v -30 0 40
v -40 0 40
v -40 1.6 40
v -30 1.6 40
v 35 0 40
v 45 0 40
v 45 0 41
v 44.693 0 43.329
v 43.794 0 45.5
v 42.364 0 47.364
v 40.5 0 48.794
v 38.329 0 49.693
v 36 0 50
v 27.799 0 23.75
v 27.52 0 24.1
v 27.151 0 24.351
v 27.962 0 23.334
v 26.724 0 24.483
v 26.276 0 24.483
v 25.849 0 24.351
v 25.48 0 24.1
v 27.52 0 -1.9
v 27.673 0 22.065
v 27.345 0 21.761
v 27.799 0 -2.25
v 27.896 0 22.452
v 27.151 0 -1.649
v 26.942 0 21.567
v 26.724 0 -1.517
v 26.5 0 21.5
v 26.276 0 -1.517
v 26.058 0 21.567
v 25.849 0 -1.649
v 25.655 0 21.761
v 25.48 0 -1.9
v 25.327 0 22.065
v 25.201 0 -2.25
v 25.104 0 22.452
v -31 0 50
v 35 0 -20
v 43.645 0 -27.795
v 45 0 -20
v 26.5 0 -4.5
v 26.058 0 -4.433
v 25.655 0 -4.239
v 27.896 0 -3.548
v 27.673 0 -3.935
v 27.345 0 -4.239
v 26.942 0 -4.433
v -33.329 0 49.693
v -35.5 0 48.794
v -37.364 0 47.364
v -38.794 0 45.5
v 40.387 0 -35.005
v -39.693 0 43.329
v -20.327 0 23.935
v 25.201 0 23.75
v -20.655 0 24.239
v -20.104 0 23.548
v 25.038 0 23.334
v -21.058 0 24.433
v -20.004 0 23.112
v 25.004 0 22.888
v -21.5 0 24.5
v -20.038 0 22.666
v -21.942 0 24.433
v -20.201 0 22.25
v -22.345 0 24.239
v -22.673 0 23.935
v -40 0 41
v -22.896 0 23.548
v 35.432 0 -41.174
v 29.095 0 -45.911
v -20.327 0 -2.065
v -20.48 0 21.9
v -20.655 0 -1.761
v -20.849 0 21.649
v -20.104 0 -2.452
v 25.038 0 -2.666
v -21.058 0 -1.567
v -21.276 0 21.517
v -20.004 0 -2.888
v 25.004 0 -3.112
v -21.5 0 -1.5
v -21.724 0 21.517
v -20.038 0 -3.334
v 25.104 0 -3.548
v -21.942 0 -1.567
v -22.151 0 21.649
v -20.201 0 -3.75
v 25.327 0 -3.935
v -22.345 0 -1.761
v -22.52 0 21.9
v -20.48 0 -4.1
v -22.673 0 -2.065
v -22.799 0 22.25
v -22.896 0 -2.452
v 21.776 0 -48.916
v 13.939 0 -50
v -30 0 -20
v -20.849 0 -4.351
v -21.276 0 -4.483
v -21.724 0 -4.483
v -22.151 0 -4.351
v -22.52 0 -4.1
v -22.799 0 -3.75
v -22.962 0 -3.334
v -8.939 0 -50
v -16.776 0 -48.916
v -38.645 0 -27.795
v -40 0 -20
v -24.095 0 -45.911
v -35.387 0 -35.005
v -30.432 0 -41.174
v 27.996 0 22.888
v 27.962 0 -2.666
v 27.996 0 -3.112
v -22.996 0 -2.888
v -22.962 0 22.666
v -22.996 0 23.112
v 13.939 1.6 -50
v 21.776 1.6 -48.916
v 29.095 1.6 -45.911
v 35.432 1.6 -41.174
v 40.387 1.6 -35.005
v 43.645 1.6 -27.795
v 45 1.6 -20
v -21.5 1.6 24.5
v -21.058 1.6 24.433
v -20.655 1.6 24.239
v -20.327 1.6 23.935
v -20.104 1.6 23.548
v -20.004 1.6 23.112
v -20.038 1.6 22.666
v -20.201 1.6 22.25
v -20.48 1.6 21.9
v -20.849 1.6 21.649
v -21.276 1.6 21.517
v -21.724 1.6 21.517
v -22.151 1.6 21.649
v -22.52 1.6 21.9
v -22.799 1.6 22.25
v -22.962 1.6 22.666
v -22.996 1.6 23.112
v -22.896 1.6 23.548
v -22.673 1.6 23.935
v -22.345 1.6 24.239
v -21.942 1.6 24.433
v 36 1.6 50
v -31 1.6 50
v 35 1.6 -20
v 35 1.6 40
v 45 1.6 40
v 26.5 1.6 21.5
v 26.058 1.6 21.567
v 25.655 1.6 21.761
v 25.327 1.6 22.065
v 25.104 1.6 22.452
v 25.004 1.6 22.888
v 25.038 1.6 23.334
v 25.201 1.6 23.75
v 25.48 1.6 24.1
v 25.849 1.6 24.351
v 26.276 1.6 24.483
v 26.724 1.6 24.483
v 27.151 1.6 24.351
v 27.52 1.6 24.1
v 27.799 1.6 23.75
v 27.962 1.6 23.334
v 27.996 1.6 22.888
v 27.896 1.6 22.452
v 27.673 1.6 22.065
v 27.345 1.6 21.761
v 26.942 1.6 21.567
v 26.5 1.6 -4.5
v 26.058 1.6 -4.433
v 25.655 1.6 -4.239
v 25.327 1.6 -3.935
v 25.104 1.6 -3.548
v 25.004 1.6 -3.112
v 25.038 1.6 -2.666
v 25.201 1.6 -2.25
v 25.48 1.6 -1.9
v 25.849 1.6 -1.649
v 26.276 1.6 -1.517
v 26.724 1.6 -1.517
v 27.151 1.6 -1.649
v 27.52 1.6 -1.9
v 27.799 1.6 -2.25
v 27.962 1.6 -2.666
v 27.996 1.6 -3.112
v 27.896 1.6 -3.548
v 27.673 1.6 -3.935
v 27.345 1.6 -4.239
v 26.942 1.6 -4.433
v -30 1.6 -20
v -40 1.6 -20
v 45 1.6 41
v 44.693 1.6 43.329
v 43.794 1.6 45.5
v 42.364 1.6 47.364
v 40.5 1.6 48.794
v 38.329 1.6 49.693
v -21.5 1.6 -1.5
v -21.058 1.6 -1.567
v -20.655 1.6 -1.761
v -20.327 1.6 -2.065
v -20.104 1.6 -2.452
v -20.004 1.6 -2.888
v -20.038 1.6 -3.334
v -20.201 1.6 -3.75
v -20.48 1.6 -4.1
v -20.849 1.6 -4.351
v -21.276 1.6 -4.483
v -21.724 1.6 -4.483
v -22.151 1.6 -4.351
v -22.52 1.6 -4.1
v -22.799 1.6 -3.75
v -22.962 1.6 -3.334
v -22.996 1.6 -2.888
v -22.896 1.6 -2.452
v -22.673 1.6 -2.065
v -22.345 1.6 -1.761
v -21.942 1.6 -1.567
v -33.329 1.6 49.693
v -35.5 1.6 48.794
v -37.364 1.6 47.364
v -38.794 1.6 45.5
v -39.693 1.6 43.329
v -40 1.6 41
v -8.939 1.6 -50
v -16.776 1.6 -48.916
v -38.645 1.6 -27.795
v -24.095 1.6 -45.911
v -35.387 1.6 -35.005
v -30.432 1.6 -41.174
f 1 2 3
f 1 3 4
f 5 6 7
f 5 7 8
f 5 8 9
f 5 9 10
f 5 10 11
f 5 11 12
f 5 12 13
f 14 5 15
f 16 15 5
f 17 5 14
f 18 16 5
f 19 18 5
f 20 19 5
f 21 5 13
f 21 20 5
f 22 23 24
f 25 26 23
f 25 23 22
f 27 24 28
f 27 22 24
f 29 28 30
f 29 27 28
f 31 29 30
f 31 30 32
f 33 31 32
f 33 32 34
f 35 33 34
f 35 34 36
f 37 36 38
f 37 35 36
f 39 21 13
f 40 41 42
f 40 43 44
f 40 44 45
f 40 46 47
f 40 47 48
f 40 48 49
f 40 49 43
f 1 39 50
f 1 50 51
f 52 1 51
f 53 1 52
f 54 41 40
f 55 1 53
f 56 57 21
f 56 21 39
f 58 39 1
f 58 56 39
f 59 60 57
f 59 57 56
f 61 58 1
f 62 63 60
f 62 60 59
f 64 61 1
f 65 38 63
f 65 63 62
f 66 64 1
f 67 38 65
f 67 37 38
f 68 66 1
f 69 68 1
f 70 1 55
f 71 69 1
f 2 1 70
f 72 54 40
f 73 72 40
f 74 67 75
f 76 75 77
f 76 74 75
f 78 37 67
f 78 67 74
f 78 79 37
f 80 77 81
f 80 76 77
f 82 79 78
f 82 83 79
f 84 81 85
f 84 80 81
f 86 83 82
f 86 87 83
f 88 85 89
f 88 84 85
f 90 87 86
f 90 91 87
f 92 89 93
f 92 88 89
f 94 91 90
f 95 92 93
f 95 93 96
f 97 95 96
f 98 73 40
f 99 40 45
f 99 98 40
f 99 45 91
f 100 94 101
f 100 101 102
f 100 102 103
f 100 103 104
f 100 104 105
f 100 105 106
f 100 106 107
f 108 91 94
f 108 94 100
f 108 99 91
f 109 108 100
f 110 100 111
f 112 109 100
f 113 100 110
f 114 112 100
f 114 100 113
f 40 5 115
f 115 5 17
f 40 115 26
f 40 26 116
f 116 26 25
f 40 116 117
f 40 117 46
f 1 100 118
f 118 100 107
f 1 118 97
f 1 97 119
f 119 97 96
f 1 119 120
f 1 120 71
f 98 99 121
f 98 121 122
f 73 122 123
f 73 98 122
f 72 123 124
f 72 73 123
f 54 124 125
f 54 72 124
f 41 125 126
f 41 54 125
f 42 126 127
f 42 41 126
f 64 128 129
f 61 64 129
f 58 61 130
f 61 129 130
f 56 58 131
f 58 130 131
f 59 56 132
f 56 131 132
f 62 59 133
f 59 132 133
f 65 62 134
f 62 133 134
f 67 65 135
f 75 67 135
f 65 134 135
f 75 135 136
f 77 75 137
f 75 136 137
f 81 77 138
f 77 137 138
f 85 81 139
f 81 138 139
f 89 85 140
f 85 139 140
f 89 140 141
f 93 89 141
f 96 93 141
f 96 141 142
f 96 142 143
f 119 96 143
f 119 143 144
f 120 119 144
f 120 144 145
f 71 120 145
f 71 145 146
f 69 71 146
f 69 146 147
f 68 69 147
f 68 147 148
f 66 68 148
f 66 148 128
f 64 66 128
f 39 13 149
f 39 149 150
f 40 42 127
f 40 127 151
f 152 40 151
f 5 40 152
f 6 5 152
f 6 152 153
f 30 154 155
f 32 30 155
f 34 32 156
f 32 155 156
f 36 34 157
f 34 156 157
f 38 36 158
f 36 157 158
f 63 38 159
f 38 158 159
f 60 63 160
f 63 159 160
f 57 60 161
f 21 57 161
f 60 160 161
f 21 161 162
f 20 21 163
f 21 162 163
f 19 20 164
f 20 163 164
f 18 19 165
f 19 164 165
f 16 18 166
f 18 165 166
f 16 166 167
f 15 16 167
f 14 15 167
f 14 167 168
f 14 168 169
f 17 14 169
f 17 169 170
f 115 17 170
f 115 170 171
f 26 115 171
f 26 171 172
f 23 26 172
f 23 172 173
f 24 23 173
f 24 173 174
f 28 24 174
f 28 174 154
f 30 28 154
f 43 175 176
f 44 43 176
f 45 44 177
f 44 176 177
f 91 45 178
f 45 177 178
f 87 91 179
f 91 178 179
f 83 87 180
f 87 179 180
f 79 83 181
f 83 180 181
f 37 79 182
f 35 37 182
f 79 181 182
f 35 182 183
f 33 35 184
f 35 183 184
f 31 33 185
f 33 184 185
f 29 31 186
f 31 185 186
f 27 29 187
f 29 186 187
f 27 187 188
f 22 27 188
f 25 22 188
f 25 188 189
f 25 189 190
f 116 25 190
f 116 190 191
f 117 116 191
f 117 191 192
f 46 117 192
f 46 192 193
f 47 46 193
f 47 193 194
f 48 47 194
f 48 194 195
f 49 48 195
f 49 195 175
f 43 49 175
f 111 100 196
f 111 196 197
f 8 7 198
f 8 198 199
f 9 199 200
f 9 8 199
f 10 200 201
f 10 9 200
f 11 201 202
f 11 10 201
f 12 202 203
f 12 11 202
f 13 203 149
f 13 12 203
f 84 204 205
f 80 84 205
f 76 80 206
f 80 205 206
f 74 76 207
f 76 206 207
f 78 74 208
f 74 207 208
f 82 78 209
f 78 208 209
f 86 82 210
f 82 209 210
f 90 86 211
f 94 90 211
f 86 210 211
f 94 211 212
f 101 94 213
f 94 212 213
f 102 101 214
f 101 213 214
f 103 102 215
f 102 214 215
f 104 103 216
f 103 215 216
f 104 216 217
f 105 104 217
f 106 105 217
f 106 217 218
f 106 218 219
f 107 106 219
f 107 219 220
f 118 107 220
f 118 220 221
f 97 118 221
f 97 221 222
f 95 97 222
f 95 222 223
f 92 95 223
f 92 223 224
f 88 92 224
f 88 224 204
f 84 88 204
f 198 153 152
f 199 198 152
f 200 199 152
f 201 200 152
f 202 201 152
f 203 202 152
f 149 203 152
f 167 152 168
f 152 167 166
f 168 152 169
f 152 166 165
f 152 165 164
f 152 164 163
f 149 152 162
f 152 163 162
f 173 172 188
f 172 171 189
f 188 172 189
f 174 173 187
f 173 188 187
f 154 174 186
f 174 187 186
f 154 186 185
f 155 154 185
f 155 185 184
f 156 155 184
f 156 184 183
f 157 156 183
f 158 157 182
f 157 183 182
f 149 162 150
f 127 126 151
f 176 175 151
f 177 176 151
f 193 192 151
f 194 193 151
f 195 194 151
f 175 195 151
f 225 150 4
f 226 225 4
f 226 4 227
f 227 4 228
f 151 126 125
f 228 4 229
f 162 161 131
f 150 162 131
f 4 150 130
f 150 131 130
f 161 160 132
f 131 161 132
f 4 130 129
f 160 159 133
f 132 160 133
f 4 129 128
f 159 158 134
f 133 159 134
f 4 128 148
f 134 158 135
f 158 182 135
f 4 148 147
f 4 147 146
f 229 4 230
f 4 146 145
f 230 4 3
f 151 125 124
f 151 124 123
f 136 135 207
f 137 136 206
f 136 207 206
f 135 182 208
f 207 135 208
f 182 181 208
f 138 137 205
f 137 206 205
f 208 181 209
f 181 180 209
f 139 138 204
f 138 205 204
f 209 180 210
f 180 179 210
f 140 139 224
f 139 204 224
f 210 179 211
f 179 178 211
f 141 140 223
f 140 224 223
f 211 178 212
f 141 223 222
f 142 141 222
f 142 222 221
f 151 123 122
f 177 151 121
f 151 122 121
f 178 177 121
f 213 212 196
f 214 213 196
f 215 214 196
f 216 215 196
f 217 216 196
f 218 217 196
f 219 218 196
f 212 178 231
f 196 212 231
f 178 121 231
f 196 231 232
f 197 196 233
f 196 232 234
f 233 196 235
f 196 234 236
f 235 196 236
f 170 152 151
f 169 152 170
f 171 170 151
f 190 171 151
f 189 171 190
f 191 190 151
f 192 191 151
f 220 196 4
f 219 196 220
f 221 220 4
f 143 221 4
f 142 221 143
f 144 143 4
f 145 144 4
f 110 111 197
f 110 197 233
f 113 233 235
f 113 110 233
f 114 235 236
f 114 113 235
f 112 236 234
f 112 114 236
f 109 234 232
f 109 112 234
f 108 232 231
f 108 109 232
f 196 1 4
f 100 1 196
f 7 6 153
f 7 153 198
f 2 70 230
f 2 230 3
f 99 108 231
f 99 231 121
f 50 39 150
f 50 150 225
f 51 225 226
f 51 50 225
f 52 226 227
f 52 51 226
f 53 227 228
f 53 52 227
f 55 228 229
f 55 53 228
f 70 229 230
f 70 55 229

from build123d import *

# Parameters (mm, degrees)
BOSS_EXTRUDE1_DEPTH            = 1.6
SKETCH2_R                      = 1.5
CUT_EXTRUDE1_DEPTH             = 68.287145875
CUT_EXTRUDE4_REACH             = 69.287
SKETCH3_W                      = 5
SKETCH3_H                      = 100
CUT_EXTRUDE4_DIRECTION_2_DEPTH = 68.287145875


with BuildPart() as part:
    # Sketch1 → Boss-Extrude1 (new body)
    with BuildSketch(Plane(origin=(0, 0, 0), x_dir=(1, 0, 0), z_dir=(0, 1, 0))):
        with BuildLine():
            Line((-13.938774234, 50), (13.938774234, 50))
            ThreePointArc((13.938774234, 50), (35.432285481, 41.173831077), (45, 20))
            Line((45, 20), (35, 20))
            Line((35, 20), (35, -40))
            Line((35, -40), (45, -40))
            Line((45, -40), (45, -41))
            ThreePointArc((45, -41), (42.363961031, -47.363961031), (36, -50))
            Line((36, -50), (-36, -50))
            ThreePointArc((-36, -50), (-42.363961031, -47.363961031), (-45, -41))
            Line((-45, -41), (-45, -40))
            Line((-45, -40), (-35, -40))
            Line((-35, -40), (-35, 20))
            Line((-35, 20), (-45, 20))
            ThreePointArc((-45, 20), (-35.432285481, 41.173831077), (-13.938774234, 50))
        make_face()
    extrude(amount=BOSS_EXTRUDE1_DEPTH)

    # Sketch2 → Cut-Extrude1 (cut, through all)
    with BuildSketch(Plane(origin=(0, 1.6, 0), x_dir=(1, 0, 0), z_dir=(0, 1, 0))):
        with Locations(Location((-26.5, 3, 0), (0, 0, 270))):
            Circle(SKETCH2_R)
        with Locations(Location((-26.5, -23, 0), (0, 0, 270))):
            Circle(SKETCH2_R)
        with Locations(Location((26.5, -23, 0), (0, 0, 90))):
            Circle(SKETCH2_R)
        with Locations(Location((26.5, 3, 0), (0, 0, 90))):
            Circle(SKETCH2_R)
    extrude(amount=-CUT_EXTRUDE1_DEPTH, mode=Mode.SUBTRACT)

    # Sketch3 → Cut-Extrude4 (cut, up to next)
    with BuildSketch(Plane(origin=(0, 0, 0), x_dir=(1, 0, 0), z_dir=(0, 1, 0)), mode=Mode.PRIVATE) as cut_extrude4_sk1:
        Rectangle(SKETCH3_W, SKETCH3_H)
    cut_extrude4_tool1 = extrude(cut_extrude4_sk1.sketch, amount=CUT_EXTRUDE4_REACH, mode=Mode.PRIVATE) & part.part
    add(cut_extrude4_tool1.solids().sort_by_distance((0, 0, 0))[0], mode=Mode.SUBTRACT)

    # Sketch3 → Cut-Extrude4 direction 2 (cut)
    with BuildSketch(Plane(origin=(0, 0, 0), x_dir=(1, 0, 0), z_dir=(0, 1, 0))):
        Rectangle(SKETCH3_W, SKETCH3_H)
    extrude(amount=-CUT_EXTRUDE4_DIRECTION_2_DEPTH, mode=Mode.SUBTRACT)


with BuildPart() as cut_extrude4_piece_1:
    # of the separate pieces the step leaves, piece 1, a body of its own (cut_extrude4_pieces)
    add(part.part.solids().sort_by_distance((2.5, 0, -50))[0])


with BuildPart() as cut_extrude4_piece_2:
    # of the separate pieces the step leaves, piece 2, a body of its own (cut_extrude4_pieces)
    add(part.part.solids().sort_by_distance((-45, 0, -20))[0])


with BuildPart() as cut_extrude4_piece_2_1:
    # Body-Move/Copy1: moved
    add(cut_extrude4_piece_2.part.moved(Location((5, 0, 0))))


with BuildPart() as cut_extrude4_piece_1_1:
    add(cut_extrude4_piece_1.part)

    # Combine1: union Cut-Extrude4 piece 2
    add(cut_extrude4_piece_2_1.part)


solid = cut_extrude4_piece_1_1.part
